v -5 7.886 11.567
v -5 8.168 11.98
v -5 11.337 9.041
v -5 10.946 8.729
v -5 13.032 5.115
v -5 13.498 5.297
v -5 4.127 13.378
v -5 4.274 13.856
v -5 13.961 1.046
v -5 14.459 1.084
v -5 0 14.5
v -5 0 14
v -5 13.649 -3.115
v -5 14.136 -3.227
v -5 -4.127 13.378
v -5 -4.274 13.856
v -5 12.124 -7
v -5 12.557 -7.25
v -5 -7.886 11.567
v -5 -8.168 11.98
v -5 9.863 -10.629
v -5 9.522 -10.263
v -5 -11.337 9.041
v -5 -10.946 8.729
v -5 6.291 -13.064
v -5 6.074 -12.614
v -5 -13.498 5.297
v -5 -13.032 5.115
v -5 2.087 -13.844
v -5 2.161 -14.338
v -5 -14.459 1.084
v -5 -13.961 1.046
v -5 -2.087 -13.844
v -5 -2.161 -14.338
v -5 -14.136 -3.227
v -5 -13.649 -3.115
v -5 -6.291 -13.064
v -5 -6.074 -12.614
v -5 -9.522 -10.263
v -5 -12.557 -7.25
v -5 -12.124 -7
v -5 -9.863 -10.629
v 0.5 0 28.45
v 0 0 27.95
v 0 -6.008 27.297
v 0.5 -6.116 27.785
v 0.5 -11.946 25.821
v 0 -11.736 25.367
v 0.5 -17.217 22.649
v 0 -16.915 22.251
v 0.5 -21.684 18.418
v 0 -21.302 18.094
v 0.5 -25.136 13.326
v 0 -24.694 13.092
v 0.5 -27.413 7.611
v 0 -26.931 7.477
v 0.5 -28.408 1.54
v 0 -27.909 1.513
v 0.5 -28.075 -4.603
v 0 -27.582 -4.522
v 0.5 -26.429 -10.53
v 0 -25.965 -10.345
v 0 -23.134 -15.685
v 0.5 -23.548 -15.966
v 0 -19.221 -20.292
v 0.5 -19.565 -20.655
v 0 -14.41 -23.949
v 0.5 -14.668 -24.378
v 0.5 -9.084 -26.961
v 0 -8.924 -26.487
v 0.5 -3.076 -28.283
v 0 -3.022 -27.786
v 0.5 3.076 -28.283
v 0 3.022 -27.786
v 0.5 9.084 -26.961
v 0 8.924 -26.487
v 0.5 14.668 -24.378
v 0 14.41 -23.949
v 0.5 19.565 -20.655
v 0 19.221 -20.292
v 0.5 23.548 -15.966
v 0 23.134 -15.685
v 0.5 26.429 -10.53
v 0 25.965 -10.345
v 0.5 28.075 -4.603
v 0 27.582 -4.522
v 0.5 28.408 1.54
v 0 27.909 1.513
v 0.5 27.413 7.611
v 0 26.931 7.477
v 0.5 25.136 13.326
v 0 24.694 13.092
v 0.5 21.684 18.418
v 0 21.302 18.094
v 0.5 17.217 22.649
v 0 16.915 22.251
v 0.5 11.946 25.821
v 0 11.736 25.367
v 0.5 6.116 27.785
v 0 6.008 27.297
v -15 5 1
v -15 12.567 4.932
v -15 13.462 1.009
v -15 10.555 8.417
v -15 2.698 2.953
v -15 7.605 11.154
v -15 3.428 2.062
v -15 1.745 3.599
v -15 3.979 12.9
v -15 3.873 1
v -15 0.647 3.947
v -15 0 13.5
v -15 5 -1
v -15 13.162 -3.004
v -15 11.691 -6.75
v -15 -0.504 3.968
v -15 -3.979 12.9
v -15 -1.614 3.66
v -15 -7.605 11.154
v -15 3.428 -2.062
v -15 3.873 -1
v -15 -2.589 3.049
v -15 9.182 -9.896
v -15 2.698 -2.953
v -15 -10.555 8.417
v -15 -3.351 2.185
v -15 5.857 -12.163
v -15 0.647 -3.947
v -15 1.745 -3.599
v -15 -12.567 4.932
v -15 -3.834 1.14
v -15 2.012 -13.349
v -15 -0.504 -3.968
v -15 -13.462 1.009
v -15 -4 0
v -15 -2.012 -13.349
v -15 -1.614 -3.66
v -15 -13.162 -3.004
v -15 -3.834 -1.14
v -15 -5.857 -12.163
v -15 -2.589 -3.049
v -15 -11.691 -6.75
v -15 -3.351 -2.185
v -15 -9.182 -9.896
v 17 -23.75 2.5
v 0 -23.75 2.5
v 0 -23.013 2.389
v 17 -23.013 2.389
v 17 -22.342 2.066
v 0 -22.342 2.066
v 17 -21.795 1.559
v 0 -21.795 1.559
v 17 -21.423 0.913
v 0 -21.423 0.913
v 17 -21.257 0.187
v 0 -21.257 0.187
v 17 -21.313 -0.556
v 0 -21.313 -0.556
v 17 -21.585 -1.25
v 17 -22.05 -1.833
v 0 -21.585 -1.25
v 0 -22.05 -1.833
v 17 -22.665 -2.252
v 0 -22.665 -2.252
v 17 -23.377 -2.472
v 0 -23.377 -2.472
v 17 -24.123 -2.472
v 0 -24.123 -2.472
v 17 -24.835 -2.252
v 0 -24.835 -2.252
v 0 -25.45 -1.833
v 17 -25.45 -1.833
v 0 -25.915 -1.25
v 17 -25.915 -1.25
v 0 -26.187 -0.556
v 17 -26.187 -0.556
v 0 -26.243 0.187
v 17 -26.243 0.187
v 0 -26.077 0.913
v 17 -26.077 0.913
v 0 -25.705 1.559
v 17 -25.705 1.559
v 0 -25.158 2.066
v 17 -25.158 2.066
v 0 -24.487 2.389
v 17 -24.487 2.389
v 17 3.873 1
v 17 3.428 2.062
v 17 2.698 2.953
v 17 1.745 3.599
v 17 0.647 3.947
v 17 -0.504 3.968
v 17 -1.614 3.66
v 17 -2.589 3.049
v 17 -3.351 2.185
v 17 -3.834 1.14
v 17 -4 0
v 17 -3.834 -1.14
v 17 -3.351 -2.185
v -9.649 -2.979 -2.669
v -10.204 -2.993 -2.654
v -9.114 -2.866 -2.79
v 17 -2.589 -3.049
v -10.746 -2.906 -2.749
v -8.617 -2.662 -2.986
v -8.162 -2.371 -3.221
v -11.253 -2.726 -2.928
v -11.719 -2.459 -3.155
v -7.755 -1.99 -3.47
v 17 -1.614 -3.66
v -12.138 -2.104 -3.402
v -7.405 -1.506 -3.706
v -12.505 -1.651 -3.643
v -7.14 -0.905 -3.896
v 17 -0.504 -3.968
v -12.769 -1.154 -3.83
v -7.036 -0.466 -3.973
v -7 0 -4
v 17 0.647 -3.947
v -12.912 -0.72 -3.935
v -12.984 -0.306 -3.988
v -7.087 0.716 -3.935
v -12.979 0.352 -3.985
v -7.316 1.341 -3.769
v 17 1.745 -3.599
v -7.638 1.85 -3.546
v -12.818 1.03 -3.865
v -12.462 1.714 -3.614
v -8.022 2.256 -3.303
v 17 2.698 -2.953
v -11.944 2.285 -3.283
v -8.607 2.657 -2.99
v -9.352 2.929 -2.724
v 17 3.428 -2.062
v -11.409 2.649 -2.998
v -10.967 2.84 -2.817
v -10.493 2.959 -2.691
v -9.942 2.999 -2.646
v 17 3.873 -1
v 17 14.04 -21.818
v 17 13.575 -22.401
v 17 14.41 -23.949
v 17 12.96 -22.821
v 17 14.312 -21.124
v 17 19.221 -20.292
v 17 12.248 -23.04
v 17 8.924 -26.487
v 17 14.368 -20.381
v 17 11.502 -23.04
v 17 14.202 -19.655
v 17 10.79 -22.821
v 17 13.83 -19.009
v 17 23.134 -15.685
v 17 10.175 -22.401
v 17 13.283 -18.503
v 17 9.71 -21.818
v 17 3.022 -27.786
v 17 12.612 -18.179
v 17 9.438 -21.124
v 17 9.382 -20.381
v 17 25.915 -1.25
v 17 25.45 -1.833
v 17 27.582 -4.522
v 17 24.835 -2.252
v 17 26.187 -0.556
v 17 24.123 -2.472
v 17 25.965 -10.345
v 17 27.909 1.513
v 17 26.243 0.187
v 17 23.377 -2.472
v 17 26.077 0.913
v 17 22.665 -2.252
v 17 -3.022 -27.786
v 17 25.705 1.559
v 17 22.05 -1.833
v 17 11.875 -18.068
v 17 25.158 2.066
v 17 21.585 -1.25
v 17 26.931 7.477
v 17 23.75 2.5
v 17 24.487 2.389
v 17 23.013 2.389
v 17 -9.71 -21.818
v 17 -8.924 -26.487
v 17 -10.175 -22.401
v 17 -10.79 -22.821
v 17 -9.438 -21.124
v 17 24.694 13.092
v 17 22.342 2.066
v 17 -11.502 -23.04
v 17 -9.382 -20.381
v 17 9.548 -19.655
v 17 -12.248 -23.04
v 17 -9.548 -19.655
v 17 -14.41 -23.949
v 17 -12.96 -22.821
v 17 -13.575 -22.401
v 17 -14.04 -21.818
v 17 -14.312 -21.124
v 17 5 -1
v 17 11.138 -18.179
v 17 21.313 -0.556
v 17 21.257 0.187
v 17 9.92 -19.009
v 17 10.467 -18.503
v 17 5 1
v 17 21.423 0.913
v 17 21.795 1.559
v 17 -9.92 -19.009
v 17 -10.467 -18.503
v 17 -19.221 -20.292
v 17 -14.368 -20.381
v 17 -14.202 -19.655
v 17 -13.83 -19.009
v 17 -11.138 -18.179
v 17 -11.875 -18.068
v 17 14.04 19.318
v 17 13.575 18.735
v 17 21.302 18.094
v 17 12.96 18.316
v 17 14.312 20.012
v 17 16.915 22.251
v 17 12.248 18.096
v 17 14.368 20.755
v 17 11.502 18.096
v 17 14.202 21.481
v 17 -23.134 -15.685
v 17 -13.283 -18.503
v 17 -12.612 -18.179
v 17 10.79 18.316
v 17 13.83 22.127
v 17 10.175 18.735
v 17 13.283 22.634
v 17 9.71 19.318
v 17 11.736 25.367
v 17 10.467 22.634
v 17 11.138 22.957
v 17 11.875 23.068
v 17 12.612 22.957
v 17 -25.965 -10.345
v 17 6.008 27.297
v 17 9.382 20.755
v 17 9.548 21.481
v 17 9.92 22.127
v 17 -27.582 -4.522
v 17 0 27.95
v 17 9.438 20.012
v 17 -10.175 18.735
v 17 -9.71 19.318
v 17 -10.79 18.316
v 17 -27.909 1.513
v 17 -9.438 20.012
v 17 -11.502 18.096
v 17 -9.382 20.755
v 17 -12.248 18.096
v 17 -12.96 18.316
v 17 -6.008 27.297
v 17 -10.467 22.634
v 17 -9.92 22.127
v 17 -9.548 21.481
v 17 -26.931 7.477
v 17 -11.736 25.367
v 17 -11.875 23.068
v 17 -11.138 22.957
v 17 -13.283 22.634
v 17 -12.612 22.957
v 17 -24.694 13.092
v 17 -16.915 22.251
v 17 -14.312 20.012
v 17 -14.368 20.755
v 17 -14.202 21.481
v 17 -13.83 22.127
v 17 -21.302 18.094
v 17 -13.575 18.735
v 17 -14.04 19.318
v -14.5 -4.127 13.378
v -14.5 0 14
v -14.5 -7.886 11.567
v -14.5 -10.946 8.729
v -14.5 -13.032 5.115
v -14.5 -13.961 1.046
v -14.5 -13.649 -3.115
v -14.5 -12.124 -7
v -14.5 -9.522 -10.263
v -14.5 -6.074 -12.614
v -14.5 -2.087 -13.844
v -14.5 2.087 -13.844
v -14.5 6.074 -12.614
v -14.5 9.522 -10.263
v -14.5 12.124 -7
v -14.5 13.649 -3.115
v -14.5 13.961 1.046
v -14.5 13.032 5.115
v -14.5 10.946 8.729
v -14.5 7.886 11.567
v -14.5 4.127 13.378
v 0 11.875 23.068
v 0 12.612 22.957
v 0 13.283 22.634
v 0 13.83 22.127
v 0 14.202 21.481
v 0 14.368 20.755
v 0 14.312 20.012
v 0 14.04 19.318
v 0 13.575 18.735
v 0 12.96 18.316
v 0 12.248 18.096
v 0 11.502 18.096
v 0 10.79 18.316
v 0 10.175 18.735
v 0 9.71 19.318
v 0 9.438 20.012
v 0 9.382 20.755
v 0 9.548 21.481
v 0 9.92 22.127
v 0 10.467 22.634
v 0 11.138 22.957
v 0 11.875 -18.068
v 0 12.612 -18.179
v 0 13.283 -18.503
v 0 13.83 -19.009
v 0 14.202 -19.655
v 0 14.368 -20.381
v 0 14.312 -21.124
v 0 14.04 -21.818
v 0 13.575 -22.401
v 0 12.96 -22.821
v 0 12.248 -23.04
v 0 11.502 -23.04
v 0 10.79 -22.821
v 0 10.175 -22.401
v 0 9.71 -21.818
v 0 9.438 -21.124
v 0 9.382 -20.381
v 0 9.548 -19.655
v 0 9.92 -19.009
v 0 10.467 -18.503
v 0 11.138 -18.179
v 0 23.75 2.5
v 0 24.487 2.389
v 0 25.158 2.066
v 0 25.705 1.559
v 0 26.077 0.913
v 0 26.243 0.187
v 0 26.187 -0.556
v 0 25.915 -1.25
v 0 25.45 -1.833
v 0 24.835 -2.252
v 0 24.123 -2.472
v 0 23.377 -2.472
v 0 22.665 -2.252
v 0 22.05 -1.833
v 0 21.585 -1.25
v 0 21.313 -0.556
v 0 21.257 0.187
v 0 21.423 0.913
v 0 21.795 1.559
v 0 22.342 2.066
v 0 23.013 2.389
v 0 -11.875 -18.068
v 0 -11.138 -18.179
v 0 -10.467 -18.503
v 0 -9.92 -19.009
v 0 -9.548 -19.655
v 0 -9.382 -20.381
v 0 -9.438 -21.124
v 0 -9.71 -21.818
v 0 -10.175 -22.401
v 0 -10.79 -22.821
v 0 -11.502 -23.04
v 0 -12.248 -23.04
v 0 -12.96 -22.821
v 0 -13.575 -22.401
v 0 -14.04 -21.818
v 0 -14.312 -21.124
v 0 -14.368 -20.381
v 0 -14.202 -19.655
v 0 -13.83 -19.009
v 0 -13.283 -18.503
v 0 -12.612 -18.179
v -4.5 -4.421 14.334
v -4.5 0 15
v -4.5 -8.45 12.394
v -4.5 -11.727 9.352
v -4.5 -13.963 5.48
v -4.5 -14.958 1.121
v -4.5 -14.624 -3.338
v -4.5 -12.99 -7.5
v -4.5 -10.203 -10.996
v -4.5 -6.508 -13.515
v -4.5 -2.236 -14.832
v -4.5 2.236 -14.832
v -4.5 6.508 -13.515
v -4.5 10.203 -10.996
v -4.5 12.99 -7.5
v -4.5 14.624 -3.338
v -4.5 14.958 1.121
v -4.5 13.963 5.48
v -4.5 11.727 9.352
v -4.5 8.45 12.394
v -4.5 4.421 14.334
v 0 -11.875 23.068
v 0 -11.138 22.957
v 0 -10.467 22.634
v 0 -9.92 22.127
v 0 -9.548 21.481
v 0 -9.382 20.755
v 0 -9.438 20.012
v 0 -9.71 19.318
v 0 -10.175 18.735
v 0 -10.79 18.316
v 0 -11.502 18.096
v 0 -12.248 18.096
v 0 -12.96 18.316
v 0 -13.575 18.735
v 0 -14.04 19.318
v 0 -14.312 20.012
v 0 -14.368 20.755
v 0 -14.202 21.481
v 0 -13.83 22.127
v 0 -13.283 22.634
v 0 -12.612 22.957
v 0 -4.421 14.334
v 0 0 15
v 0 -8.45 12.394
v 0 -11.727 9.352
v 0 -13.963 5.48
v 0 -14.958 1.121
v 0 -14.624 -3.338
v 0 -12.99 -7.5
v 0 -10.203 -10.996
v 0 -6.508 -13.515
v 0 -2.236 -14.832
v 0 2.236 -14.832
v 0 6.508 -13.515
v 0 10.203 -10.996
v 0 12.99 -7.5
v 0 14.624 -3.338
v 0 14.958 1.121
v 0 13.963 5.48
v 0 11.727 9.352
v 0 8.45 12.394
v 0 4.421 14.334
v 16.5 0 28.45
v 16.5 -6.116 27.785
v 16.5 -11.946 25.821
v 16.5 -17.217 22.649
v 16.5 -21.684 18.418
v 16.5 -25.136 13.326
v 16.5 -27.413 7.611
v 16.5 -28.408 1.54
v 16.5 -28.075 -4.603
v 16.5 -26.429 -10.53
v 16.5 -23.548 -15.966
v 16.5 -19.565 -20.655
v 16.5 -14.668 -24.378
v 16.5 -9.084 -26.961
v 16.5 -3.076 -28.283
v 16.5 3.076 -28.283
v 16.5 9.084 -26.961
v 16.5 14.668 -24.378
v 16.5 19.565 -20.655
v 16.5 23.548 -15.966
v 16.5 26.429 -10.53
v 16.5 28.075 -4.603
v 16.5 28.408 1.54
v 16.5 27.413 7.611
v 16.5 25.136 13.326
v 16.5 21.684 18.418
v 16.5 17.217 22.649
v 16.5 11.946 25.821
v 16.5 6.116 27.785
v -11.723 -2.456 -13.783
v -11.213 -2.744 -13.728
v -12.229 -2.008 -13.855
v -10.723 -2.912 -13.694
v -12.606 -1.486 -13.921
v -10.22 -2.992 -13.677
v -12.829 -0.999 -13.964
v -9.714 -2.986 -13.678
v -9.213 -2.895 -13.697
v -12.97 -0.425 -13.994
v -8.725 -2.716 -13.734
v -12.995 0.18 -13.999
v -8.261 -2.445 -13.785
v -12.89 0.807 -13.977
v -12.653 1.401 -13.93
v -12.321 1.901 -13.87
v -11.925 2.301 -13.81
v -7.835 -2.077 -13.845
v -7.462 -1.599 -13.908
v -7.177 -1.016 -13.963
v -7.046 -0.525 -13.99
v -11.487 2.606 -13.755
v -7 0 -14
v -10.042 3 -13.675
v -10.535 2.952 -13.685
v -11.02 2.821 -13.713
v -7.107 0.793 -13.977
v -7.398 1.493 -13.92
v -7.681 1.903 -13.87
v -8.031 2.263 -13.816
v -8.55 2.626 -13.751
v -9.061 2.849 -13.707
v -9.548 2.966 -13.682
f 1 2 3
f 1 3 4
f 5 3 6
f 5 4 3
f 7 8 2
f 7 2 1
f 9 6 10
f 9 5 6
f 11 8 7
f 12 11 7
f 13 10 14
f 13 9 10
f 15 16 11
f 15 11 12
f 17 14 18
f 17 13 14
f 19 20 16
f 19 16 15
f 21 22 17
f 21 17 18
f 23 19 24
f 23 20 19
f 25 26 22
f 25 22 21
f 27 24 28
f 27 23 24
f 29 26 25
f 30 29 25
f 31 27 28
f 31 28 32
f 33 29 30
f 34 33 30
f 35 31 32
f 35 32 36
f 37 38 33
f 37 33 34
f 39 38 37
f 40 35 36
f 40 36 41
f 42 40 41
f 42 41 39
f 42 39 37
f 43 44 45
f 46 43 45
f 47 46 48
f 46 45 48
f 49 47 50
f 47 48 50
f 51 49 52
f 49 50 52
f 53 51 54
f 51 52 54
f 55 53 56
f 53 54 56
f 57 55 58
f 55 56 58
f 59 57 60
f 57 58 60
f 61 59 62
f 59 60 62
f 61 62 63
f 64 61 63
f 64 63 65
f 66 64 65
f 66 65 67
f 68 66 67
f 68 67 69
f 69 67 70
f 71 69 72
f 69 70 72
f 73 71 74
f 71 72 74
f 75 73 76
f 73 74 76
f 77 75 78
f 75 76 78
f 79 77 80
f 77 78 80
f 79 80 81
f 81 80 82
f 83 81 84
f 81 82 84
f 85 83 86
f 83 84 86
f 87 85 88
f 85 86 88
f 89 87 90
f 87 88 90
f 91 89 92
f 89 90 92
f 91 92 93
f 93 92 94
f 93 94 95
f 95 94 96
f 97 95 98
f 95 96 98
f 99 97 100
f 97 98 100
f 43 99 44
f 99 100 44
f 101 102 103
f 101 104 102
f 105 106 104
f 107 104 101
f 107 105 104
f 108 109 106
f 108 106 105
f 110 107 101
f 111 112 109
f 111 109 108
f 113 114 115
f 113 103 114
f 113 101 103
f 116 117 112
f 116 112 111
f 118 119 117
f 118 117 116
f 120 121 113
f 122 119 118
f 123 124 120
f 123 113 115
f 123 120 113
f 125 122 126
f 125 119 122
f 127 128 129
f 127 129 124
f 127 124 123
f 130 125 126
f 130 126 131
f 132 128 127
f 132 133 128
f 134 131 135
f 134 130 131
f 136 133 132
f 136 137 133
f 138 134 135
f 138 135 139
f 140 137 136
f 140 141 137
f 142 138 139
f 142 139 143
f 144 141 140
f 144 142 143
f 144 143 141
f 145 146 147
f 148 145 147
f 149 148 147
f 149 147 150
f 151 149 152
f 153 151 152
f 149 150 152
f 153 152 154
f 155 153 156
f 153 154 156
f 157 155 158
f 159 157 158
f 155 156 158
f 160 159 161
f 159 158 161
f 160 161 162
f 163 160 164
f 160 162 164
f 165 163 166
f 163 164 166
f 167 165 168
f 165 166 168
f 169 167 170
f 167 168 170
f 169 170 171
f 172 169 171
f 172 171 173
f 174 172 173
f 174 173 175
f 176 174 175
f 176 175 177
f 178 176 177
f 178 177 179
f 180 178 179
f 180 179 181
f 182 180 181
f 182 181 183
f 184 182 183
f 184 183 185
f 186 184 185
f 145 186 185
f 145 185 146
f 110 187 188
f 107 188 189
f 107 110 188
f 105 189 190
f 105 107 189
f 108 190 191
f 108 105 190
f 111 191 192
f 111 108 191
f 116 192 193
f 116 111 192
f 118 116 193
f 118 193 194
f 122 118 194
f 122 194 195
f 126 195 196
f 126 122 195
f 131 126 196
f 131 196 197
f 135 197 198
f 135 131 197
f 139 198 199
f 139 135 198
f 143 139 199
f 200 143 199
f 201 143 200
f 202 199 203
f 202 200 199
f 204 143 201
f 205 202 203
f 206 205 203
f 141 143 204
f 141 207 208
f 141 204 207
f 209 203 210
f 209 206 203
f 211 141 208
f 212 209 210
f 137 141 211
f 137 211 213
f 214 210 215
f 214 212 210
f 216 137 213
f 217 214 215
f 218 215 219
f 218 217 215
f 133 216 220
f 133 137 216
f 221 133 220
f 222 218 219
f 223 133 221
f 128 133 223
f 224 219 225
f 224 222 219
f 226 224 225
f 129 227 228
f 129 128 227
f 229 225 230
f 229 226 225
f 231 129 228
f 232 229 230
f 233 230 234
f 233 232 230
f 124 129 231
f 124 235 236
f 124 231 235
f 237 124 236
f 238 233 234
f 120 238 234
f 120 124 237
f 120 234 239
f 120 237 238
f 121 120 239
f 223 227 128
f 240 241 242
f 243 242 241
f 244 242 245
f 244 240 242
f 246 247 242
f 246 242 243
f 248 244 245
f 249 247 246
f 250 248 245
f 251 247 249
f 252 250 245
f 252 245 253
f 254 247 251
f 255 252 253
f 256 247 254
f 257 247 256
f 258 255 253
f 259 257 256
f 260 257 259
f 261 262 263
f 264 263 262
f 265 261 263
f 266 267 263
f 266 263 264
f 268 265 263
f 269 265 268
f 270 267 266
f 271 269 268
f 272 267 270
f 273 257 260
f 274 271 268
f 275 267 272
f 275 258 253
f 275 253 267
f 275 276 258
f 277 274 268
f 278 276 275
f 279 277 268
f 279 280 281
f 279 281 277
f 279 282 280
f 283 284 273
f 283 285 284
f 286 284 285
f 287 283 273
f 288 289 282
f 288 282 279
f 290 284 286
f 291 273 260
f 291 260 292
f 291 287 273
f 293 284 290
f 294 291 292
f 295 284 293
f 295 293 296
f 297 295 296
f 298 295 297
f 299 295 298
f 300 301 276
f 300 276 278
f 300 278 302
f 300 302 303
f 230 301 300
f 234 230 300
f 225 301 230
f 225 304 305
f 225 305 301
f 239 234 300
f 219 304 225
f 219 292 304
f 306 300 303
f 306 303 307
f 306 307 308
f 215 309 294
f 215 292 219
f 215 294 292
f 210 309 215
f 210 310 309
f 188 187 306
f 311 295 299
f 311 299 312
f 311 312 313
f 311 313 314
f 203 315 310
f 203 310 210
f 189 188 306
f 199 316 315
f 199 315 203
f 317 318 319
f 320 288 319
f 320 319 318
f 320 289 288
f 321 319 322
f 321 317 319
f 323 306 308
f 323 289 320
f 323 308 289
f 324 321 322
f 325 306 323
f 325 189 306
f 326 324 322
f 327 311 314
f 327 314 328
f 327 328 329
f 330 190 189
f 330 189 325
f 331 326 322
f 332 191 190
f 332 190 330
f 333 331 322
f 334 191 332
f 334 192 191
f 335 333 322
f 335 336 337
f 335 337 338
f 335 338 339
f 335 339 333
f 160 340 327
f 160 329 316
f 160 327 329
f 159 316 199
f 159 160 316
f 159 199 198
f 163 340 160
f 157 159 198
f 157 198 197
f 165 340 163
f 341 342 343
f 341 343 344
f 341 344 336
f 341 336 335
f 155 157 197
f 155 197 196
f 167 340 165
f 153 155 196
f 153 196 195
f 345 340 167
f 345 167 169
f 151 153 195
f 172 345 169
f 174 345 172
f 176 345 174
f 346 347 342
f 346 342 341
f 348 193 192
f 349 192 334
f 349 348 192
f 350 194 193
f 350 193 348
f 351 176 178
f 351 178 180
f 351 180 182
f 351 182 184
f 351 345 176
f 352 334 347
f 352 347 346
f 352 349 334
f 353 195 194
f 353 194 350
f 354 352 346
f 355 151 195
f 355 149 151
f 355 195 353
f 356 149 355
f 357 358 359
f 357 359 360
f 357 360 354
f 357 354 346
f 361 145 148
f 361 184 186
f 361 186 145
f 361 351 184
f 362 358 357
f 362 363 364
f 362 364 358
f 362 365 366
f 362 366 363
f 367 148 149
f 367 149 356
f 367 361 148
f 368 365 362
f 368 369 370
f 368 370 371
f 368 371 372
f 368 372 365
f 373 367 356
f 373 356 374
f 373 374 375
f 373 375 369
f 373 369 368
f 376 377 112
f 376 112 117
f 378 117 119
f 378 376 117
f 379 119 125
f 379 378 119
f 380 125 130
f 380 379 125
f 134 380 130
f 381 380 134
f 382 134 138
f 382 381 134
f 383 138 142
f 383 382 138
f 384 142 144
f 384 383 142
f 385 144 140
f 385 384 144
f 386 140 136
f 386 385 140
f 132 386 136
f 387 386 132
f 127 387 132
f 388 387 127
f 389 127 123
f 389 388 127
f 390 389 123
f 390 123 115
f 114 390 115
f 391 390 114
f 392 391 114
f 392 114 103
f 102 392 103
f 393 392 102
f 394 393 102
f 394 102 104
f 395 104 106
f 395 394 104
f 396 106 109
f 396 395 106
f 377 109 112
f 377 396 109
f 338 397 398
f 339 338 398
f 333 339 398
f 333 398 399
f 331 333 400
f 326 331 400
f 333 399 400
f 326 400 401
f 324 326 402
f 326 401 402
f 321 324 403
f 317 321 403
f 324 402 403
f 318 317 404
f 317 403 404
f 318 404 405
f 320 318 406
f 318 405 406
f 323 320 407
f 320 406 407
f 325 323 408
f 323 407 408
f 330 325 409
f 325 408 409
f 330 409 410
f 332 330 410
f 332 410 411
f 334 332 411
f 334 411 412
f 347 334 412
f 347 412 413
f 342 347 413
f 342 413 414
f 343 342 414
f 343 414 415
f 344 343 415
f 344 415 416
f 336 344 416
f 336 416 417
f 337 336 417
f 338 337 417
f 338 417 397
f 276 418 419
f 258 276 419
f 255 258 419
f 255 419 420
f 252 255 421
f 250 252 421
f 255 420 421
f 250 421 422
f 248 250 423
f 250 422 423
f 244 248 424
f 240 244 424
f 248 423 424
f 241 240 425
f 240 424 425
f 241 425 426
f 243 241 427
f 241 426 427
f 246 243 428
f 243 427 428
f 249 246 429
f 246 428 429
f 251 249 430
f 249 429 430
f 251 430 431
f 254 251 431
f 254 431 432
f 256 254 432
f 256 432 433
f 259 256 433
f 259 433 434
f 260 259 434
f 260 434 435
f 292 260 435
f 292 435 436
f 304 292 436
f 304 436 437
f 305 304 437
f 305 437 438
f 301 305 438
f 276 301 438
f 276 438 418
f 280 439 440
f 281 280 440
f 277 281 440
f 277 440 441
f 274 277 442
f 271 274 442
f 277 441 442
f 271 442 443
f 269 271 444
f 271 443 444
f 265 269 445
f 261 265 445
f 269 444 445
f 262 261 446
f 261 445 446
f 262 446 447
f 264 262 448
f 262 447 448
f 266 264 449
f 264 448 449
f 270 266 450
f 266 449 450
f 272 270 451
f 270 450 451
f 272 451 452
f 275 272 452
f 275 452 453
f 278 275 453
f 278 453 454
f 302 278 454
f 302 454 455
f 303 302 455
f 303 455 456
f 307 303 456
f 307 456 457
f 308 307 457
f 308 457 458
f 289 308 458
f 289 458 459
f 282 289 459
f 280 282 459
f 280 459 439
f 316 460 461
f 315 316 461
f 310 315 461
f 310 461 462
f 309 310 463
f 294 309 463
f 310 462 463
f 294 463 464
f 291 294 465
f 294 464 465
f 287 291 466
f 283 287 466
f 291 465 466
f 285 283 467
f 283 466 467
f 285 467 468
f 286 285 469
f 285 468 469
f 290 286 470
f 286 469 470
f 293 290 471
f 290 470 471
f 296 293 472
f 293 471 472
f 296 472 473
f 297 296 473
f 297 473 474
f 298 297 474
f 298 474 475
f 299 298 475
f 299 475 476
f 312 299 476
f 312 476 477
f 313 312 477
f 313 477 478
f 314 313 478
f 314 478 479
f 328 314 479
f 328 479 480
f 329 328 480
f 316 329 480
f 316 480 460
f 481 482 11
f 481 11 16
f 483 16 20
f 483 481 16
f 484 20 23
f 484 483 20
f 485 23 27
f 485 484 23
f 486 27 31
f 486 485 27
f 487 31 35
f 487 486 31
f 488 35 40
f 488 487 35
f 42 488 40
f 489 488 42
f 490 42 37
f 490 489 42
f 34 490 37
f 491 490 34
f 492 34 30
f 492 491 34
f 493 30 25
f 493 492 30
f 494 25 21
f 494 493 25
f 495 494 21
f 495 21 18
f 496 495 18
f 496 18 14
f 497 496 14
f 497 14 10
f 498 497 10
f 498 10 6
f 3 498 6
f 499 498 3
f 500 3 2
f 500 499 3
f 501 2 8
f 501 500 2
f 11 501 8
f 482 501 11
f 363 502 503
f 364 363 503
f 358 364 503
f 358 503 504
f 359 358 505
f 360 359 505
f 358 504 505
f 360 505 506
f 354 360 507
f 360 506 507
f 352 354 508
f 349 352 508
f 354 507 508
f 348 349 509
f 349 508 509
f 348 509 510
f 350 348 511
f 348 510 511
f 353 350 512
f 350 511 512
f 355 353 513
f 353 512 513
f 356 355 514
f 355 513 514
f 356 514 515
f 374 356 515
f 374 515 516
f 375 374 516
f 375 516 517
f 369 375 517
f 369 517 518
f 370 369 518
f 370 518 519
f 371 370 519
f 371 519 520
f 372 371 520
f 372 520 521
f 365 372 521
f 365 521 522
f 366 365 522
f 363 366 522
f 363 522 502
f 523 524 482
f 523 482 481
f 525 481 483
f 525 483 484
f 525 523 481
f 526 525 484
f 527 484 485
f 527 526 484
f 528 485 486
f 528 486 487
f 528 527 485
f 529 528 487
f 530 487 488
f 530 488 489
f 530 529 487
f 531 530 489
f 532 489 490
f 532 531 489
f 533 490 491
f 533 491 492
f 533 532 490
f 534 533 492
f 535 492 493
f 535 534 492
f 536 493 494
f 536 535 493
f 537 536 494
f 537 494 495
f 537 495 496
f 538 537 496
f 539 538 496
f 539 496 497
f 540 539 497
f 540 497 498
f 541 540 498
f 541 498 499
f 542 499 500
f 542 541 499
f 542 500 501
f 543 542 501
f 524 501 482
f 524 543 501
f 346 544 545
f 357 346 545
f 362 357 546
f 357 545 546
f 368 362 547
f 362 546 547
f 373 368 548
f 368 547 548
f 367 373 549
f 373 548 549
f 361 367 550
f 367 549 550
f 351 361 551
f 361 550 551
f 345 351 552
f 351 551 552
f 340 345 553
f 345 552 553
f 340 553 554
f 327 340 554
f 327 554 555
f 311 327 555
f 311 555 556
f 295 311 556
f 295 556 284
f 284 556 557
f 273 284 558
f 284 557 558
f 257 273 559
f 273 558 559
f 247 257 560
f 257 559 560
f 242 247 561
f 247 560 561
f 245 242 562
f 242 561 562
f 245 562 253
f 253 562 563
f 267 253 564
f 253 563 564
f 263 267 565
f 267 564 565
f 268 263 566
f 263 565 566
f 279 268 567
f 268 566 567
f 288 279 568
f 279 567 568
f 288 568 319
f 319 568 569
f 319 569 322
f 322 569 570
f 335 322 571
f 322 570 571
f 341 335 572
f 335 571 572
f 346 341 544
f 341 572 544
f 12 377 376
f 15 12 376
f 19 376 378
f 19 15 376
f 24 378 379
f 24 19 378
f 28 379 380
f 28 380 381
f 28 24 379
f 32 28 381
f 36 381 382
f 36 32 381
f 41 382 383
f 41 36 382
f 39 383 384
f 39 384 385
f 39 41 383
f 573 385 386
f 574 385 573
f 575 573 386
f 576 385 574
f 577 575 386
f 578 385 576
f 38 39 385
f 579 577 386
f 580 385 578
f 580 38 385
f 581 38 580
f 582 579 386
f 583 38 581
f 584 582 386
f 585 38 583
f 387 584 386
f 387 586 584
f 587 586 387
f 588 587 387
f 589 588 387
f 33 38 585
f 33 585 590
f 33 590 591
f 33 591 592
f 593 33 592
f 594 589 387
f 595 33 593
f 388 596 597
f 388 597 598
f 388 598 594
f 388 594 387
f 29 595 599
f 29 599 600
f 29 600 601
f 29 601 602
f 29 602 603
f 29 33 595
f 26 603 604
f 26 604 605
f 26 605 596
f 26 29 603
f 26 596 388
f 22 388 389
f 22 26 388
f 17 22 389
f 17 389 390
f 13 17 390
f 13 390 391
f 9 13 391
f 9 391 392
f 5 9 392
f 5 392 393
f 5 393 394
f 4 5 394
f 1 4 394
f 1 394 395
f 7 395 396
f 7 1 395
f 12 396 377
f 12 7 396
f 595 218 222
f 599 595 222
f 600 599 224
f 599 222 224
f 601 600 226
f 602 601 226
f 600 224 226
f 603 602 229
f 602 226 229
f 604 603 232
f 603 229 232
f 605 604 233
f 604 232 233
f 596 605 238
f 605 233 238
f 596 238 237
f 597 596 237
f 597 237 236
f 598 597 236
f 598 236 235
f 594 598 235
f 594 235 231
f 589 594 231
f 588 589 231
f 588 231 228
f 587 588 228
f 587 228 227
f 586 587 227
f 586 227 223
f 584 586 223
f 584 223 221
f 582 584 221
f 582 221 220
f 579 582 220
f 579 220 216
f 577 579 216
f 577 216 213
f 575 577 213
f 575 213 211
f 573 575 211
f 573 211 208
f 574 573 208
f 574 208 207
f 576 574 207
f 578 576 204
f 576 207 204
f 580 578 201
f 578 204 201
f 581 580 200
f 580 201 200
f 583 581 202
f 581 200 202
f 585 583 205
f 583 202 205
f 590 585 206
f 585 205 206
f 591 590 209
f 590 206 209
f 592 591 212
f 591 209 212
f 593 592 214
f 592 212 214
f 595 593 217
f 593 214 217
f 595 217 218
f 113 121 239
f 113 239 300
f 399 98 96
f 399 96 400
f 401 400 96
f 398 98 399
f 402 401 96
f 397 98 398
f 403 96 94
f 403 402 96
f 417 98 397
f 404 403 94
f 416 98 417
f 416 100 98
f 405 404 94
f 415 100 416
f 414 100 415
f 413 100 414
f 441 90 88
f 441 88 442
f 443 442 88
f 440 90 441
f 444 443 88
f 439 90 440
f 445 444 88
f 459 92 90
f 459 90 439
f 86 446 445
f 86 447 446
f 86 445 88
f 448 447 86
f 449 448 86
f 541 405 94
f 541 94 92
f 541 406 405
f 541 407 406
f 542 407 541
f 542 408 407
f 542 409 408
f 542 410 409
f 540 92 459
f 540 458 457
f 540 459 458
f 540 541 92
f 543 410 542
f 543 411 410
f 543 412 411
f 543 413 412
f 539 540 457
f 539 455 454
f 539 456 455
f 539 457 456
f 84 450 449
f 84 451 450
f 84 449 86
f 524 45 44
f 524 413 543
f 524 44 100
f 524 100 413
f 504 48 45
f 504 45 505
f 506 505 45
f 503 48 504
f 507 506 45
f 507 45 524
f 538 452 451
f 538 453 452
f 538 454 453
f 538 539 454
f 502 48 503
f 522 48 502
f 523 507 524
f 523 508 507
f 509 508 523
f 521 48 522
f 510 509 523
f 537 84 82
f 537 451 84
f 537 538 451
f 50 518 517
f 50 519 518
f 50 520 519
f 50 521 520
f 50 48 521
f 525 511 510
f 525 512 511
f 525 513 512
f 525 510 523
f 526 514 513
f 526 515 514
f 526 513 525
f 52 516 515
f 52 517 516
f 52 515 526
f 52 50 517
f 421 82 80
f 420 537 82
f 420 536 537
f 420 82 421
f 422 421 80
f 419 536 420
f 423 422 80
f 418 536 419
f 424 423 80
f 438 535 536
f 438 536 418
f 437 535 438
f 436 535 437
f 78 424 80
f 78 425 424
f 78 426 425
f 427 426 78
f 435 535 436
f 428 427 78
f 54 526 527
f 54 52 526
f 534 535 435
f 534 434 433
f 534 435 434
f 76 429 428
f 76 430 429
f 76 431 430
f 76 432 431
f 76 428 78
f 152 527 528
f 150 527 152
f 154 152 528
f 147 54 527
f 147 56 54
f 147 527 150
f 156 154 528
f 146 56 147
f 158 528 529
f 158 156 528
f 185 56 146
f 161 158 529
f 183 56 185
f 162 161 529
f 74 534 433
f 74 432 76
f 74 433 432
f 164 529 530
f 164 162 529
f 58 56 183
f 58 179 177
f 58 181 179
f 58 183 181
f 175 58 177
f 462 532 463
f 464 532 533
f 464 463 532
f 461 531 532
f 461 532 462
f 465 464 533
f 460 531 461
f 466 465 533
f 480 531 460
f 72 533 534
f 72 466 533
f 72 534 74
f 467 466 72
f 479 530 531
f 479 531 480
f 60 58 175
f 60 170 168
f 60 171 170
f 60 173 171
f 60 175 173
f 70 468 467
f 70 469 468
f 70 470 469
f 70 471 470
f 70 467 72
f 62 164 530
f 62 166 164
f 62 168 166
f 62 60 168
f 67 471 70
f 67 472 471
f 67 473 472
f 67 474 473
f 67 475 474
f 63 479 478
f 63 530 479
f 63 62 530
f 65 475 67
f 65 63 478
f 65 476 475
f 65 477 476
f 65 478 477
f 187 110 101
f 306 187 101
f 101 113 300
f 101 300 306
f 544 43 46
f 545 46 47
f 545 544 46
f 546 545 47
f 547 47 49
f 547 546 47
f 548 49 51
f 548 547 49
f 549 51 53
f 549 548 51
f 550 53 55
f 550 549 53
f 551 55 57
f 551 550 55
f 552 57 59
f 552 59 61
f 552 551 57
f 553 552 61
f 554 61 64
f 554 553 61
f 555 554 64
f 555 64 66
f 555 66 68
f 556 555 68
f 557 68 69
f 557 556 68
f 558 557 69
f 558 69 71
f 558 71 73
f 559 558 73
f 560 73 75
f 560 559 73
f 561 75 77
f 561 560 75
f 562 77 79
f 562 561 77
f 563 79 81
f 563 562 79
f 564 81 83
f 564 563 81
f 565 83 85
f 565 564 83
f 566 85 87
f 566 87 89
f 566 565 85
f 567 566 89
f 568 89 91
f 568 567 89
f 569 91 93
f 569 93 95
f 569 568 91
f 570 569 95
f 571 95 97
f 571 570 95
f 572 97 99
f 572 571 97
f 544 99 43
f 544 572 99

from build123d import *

# Parameters (mm, degrees)
ESQUISSE2_R             = 2.5
ENL_V_MAT_EXTRU_1_DEPTH = 44.678427169
ESQUISSE3_W             = 2
ESQUISSE3_H             = 2.737754662
ENL_V_MAT_EXTRU_2_DEPTH = 52.408219187
ESQUISSE4_R             = 3
ENL_V_MAT_EXTRU_3_DEPTH = 20
CHANFREIN1_SIZE         = 0.5


with BuildPart() as part:
    # Esquisse1 → Révolution1 (revolve)
    with BuildSketch(Plane.XY, mode=Mode.PRIVATE) as r_volution1_sk:
        Polygon((-15, 4), (-15, 14), (-5, 14), (-5, 15), (0, 15), (0, 28.45), (17, 28.45), (17, 4), align=None)
    revolve(r_volution1_sk.sketch.rotate(Axis((-36.38001638, 0, 0), (1, 0, 0)), 90), axis=Axis((-36.38001638, 0, 0), (1, 0, 0)))

    # Esquisse2 → Enlèv. mat.-Extru.1 (cut, through all)
    with BuildSketch(Plane.ZY):
        with Locations((0, 23.75)):
            Circle(ESQUISSE2_R)
        with Locations((20.56810334, 11.875)):
            Circle(ESQUISSE2_R)
        with Locations((20.56810334, -11.875)):
            Circle(ESQUISSE2_R)
        with Locations((0, -23.75)):
            Circle(ESQUISSE2_R)
        with Locations((-20.56810334, -11.875)):
            Circle(ESQUISSE2_R)
        with Locations((-20.56810334, 11.875)):
            Circle(ESQUISSE2_R)
    extrude(amount=-ENL_V_MAT_EXTRU_1_DEPTH, mode=Mode.SUBTRACT)

    # Esquisse3 → Enlèv. mat.-Extru.2 (cut, through all)
    with BuildSketch(Plane.ZY.offset(15)):
        with Locations((0, 3.631122669)):
            Rectangle(ESQUISSE3_W, ESQUISSE3_H)
    extrude(amount=-ENL_V_MAT_EXTRU_2_DEPTH, mode=Mode.SUBTRACT)

    # Esquisse4 → Enlèv. mat.-Extru.3 (cut)
    with BuildSketch(Plane.XY):
        with Locations((-10, 0)):
            Circle(ESQUISSE4_R)
    extrude(amount=-ENL_V_MAT_EXTRU_3_DEPTH, mode=Mode.SUBTRACT)

    # Chanfrein1
    chanfrein1_edges = [part.edges().sort_by_distance(p)[0] for p in [
        (17, 0, -28.45),
        (0, 0, -28.45),
        (-5, 0, -15),
        (-15, 0, -14),
    ]]
    chamfer(chanfrein1_edges, length=CHANFREIN1_SIZE)


solid = part.part
